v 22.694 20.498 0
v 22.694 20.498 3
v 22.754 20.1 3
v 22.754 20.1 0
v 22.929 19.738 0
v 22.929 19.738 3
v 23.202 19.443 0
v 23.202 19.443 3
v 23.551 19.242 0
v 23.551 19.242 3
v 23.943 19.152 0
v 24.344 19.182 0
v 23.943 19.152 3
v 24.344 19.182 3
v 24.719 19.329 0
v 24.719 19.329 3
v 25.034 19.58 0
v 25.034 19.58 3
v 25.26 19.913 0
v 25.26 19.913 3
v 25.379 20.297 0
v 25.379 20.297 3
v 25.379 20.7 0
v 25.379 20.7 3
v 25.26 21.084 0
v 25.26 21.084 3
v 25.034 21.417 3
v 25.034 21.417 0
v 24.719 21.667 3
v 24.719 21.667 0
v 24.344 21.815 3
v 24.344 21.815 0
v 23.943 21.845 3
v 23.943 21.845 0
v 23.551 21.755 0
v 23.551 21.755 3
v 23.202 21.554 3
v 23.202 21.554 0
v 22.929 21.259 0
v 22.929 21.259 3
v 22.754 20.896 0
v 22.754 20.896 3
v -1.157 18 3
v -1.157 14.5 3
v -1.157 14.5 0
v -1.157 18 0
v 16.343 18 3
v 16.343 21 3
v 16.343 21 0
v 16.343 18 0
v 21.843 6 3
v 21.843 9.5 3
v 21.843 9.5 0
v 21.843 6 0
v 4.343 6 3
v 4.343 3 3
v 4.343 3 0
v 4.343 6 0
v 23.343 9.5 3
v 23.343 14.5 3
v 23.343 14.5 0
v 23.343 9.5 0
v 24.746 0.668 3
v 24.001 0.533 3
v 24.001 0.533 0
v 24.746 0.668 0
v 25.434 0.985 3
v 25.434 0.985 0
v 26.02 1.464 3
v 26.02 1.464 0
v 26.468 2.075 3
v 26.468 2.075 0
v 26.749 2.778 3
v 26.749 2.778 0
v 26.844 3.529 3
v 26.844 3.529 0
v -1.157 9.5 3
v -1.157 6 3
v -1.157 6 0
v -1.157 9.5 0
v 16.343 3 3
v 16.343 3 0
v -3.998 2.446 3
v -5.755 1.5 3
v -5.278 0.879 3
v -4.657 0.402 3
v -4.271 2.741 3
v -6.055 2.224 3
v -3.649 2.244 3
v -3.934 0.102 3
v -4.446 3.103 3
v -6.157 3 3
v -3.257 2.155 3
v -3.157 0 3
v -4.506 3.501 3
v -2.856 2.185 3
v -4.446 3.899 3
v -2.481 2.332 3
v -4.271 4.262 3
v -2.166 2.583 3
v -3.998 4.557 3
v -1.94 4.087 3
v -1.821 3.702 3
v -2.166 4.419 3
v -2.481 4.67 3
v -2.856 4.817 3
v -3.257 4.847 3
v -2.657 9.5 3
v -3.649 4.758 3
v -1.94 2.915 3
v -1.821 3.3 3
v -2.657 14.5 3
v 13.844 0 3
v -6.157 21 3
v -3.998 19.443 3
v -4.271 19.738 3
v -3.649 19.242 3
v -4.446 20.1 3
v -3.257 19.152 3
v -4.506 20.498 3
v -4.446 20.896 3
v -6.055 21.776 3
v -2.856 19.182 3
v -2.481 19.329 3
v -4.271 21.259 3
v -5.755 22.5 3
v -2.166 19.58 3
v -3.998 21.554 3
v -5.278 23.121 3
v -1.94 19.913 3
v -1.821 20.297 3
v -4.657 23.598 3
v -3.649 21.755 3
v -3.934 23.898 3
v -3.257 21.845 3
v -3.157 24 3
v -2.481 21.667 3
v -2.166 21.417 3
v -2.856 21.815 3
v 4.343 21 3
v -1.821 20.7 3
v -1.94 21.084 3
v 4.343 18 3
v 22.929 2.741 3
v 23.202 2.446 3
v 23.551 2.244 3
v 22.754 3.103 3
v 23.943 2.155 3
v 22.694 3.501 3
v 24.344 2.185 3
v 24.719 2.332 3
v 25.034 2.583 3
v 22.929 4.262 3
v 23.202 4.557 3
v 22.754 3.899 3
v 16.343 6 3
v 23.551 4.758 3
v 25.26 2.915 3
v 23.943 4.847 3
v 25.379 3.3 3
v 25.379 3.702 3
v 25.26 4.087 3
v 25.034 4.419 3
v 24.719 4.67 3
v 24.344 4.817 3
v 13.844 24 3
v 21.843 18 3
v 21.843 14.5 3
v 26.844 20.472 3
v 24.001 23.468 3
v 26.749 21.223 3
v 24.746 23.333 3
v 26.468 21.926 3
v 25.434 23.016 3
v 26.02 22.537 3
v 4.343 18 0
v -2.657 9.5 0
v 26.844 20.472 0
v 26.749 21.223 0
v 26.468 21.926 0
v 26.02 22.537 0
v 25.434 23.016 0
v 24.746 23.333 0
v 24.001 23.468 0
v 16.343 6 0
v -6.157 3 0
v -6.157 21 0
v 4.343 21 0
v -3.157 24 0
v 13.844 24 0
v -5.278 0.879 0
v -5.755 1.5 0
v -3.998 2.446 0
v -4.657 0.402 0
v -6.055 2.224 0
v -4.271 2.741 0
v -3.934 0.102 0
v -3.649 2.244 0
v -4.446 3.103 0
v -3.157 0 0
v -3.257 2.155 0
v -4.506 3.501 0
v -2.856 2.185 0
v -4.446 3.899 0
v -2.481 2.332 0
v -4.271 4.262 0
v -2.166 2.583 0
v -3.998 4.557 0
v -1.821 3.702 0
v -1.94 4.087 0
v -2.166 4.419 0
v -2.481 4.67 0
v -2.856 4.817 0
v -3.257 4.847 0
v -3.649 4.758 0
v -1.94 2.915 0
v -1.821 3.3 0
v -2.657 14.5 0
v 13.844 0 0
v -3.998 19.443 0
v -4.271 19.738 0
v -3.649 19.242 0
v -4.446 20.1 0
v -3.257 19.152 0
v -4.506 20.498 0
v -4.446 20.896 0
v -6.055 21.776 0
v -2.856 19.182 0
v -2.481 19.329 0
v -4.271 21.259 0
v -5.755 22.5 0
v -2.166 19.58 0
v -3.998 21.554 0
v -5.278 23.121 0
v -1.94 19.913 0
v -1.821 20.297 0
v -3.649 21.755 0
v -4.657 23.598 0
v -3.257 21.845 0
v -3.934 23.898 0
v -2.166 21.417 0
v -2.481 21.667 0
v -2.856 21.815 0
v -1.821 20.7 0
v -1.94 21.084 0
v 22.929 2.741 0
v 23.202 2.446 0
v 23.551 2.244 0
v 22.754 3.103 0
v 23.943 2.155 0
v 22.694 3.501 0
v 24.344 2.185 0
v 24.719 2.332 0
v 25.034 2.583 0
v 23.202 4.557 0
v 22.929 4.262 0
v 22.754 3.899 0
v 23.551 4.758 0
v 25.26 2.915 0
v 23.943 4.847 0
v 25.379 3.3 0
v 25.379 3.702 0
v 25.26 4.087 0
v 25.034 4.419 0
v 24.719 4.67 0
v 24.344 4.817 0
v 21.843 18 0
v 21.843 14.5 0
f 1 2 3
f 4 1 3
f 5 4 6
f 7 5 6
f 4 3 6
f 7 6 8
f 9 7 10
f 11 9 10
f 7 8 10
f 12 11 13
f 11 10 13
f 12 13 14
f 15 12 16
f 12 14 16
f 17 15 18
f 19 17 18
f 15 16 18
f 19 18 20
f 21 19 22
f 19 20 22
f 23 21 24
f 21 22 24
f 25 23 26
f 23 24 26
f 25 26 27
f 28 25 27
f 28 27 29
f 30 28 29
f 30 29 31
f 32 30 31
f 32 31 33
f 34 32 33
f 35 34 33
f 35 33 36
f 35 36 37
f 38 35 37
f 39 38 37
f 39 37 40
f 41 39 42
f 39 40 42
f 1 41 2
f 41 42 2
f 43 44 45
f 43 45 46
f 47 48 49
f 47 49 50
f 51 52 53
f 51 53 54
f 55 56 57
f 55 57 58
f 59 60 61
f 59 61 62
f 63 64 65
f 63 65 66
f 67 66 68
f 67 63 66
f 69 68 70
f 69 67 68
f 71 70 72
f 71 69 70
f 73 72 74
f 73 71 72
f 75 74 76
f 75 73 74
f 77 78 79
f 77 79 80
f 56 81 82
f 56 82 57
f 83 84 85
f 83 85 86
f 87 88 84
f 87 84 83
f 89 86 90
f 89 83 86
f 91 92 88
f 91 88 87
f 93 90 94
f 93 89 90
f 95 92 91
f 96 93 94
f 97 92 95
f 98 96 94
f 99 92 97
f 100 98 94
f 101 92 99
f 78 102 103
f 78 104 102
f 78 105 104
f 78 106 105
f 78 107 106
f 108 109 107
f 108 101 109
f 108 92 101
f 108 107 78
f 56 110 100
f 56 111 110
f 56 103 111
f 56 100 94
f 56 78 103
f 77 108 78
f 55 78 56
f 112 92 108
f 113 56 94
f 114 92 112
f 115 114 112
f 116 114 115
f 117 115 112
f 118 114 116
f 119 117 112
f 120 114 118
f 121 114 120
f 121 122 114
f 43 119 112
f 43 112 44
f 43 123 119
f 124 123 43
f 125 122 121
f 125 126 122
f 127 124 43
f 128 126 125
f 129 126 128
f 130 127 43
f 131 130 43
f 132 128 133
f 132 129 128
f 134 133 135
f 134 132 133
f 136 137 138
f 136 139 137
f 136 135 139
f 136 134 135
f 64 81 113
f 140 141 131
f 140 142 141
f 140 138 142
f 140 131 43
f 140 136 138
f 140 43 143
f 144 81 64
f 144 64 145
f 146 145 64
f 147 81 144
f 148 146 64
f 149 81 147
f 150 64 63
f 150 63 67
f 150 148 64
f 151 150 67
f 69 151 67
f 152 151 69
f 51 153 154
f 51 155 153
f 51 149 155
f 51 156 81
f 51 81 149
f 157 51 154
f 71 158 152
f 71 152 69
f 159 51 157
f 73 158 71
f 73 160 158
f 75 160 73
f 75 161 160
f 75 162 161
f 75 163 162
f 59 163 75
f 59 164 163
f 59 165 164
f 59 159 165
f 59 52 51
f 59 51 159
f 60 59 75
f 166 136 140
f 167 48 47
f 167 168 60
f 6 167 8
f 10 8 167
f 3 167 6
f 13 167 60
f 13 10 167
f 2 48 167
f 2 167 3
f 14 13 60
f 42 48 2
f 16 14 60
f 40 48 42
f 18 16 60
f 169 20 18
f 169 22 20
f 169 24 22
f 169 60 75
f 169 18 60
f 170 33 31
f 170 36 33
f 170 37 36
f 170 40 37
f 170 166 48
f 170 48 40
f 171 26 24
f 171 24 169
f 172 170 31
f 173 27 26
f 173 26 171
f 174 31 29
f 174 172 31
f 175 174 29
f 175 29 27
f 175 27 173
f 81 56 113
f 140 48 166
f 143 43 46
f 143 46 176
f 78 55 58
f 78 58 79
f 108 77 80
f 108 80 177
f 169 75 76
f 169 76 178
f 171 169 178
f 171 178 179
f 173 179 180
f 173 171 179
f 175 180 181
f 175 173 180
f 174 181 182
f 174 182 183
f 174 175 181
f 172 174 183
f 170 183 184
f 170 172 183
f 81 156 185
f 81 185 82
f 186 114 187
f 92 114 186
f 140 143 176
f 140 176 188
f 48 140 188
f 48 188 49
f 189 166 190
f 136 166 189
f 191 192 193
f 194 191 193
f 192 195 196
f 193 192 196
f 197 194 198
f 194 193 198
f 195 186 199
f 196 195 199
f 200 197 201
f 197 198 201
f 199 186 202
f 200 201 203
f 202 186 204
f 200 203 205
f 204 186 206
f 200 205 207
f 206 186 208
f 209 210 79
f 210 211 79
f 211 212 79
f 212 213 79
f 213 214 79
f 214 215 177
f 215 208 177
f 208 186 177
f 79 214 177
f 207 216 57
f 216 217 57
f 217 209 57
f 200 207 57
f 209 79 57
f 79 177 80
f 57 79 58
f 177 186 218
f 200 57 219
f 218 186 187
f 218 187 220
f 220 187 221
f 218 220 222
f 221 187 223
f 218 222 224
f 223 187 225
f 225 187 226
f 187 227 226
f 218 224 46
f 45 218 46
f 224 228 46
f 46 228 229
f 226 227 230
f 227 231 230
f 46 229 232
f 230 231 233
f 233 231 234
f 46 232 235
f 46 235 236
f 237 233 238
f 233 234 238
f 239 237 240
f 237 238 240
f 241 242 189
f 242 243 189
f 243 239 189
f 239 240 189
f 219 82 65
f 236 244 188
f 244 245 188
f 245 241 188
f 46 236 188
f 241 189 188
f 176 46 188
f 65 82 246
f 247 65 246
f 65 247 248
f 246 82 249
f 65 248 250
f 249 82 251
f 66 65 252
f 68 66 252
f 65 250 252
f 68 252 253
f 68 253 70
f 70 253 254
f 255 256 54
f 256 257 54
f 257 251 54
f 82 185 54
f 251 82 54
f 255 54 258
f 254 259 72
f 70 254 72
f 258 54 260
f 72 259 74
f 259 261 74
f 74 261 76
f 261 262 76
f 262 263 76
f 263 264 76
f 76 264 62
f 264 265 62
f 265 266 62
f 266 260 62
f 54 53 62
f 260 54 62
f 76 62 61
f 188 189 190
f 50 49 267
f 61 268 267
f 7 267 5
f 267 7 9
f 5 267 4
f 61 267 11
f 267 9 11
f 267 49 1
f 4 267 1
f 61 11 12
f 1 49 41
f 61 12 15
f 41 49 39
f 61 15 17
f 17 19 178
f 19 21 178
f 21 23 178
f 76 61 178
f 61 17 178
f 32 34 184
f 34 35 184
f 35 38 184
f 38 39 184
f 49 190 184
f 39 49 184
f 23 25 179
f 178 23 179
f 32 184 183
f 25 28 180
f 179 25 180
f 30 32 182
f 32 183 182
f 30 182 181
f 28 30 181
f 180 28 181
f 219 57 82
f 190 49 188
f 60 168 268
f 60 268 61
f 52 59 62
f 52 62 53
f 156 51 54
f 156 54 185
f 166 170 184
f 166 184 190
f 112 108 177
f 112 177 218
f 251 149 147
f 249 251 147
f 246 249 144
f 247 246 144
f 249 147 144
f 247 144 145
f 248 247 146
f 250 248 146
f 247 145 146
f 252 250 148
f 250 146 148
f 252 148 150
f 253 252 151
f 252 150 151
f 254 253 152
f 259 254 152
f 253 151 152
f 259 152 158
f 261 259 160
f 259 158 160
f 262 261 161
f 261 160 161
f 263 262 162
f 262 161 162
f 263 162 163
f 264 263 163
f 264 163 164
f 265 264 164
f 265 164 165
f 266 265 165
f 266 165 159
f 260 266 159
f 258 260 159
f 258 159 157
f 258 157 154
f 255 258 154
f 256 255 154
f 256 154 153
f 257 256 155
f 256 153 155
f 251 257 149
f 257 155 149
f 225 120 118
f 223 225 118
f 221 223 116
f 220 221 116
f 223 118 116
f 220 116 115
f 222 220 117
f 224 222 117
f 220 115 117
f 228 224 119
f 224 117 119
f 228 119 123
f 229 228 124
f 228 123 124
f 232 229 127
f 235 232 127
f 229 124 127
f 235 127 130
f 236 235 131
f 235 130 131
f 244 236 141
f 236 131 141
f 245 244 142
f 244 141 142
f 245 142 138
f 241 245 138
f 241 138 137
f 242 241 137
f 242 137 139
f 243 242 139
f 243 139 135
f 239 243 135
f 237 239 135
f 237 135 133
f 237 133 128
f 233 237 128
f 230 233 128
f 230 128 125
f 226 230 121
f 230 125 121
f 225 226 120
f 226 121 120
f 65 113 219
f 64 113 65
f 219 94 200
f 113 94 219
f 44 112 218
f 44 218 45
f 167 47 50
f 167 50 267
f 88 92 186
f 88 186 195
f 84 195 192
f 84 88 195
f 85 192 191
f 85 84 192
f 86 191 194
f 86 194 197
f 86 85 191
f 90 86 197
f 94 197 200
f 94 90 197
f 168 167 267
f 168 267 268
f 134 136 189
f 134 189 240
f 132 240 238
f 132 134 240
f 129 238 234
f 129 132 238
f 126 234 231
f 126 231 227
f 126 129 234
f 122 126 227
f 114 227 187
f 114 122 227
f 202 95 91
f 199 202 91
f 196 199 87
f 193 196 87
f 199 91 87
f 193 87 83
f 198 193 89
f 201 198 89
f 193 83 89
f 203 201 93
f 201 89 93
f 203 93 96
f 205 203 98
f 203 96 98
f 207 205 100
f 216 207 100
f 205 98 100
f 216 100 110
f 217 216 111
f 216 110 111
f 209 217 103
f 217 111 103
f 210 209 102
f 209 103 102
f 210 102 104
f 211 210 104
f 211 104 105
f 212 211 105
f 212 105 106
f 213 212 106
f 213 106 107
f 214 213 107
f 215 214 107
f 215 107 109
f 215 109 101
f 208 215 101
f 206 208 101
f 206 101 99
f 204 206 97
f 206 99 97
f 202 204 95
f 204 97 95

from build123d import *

# Parameters (mm, degrees)
SKETCH_1_R      = 1.35
EXTRUDE_1_DEPTH = 3


with BuildPart() as part:
    # 草图1 → 凸台-拉伸1 (new body)
    with BuildSketch(Plane.XY.offset(3)):
        with BuildLine():
            Line((-6.157118156, 20.9998), (-6.157118156, 3))
            ThreePointArc((-6.157118156, 3), (-5.2784385, 0.878679656), (-3.157118156, 0))
            Line((-3.157118156, 0), (13.843681844, 0))
            Line((13.843681844, 0), (24.001386189, 0.533010723))
            ThreePointArc((24.001386189, 0.533010723), (26.020372671, 1.463896655), (26.844181844, 3.528889024))
            Line((26.844181844, 3.528889024), (26.844181844, 20.471910982))
            ThreePointArc((26.844181844, 20.471910982), (26.020271299, 22.537010177), (24.001092054, 23.467804703))
            Line((24.001092054, 23.467804703), (13.843681844, 23.9998))
            Line((13.843681844, 23.9998), (-3.157118156, 23.9998))
            ThreePointArc((-3.157118156, 23.9998), (-5.2784385, 23.121120344), (-6.157118156, 20.9998))
        make_face()
        with Locations(Location((-3.156018156, 20.498351651, 0), (0, 0, 180))):
            Circle(SKETCH_1_R, mode=Mode.SUBTRACT)
        with Locations(Location((24.044031844, 20.498351651, 0), (0, 0, 180))):
            Circle(SKETCH_1_R, mode=Mode.SUBTRACT)
        with Locations(Location((-3.156018156, 3.501148349, 0), (0, 0, 180))):
            Circle(SKETCH_1_R, mode=Mode.SUBTRACT)
        with Locations(Location((24.044031844, 3.501148349, 0), (0, 0, 180))):
            Circle(SKETCH_1_R, mode=Mode.SUBTRACT)
        Polygon((23.343481844, 9.5), (21.843181844, 9.5), (21.843181844, 6), (16.343381844, 6), (16.343381844, 3), (4.343381844, 3), (4.343381844, 6), (-1.156518156, 6), (-1.156518156, 9.5), (-2.656818156, 9.5), (-2.656818156, 14.4995), (-1.156518156, 14.4995), (-1.156518156, 17.9998), (4.343381844, 17.9998), (4.343381844, 20.9998), (16.343381844, 20.9998), (16.343381844, 17.9998), (21.843181844, 17.9998), (21.843181844, 14.4995), (23.343481844, 14.4995), align=None, mode=Mode.SUBTRACT)
    extrude(amount=-EXTRUDE_1_DEPTH)


solid = part.part
